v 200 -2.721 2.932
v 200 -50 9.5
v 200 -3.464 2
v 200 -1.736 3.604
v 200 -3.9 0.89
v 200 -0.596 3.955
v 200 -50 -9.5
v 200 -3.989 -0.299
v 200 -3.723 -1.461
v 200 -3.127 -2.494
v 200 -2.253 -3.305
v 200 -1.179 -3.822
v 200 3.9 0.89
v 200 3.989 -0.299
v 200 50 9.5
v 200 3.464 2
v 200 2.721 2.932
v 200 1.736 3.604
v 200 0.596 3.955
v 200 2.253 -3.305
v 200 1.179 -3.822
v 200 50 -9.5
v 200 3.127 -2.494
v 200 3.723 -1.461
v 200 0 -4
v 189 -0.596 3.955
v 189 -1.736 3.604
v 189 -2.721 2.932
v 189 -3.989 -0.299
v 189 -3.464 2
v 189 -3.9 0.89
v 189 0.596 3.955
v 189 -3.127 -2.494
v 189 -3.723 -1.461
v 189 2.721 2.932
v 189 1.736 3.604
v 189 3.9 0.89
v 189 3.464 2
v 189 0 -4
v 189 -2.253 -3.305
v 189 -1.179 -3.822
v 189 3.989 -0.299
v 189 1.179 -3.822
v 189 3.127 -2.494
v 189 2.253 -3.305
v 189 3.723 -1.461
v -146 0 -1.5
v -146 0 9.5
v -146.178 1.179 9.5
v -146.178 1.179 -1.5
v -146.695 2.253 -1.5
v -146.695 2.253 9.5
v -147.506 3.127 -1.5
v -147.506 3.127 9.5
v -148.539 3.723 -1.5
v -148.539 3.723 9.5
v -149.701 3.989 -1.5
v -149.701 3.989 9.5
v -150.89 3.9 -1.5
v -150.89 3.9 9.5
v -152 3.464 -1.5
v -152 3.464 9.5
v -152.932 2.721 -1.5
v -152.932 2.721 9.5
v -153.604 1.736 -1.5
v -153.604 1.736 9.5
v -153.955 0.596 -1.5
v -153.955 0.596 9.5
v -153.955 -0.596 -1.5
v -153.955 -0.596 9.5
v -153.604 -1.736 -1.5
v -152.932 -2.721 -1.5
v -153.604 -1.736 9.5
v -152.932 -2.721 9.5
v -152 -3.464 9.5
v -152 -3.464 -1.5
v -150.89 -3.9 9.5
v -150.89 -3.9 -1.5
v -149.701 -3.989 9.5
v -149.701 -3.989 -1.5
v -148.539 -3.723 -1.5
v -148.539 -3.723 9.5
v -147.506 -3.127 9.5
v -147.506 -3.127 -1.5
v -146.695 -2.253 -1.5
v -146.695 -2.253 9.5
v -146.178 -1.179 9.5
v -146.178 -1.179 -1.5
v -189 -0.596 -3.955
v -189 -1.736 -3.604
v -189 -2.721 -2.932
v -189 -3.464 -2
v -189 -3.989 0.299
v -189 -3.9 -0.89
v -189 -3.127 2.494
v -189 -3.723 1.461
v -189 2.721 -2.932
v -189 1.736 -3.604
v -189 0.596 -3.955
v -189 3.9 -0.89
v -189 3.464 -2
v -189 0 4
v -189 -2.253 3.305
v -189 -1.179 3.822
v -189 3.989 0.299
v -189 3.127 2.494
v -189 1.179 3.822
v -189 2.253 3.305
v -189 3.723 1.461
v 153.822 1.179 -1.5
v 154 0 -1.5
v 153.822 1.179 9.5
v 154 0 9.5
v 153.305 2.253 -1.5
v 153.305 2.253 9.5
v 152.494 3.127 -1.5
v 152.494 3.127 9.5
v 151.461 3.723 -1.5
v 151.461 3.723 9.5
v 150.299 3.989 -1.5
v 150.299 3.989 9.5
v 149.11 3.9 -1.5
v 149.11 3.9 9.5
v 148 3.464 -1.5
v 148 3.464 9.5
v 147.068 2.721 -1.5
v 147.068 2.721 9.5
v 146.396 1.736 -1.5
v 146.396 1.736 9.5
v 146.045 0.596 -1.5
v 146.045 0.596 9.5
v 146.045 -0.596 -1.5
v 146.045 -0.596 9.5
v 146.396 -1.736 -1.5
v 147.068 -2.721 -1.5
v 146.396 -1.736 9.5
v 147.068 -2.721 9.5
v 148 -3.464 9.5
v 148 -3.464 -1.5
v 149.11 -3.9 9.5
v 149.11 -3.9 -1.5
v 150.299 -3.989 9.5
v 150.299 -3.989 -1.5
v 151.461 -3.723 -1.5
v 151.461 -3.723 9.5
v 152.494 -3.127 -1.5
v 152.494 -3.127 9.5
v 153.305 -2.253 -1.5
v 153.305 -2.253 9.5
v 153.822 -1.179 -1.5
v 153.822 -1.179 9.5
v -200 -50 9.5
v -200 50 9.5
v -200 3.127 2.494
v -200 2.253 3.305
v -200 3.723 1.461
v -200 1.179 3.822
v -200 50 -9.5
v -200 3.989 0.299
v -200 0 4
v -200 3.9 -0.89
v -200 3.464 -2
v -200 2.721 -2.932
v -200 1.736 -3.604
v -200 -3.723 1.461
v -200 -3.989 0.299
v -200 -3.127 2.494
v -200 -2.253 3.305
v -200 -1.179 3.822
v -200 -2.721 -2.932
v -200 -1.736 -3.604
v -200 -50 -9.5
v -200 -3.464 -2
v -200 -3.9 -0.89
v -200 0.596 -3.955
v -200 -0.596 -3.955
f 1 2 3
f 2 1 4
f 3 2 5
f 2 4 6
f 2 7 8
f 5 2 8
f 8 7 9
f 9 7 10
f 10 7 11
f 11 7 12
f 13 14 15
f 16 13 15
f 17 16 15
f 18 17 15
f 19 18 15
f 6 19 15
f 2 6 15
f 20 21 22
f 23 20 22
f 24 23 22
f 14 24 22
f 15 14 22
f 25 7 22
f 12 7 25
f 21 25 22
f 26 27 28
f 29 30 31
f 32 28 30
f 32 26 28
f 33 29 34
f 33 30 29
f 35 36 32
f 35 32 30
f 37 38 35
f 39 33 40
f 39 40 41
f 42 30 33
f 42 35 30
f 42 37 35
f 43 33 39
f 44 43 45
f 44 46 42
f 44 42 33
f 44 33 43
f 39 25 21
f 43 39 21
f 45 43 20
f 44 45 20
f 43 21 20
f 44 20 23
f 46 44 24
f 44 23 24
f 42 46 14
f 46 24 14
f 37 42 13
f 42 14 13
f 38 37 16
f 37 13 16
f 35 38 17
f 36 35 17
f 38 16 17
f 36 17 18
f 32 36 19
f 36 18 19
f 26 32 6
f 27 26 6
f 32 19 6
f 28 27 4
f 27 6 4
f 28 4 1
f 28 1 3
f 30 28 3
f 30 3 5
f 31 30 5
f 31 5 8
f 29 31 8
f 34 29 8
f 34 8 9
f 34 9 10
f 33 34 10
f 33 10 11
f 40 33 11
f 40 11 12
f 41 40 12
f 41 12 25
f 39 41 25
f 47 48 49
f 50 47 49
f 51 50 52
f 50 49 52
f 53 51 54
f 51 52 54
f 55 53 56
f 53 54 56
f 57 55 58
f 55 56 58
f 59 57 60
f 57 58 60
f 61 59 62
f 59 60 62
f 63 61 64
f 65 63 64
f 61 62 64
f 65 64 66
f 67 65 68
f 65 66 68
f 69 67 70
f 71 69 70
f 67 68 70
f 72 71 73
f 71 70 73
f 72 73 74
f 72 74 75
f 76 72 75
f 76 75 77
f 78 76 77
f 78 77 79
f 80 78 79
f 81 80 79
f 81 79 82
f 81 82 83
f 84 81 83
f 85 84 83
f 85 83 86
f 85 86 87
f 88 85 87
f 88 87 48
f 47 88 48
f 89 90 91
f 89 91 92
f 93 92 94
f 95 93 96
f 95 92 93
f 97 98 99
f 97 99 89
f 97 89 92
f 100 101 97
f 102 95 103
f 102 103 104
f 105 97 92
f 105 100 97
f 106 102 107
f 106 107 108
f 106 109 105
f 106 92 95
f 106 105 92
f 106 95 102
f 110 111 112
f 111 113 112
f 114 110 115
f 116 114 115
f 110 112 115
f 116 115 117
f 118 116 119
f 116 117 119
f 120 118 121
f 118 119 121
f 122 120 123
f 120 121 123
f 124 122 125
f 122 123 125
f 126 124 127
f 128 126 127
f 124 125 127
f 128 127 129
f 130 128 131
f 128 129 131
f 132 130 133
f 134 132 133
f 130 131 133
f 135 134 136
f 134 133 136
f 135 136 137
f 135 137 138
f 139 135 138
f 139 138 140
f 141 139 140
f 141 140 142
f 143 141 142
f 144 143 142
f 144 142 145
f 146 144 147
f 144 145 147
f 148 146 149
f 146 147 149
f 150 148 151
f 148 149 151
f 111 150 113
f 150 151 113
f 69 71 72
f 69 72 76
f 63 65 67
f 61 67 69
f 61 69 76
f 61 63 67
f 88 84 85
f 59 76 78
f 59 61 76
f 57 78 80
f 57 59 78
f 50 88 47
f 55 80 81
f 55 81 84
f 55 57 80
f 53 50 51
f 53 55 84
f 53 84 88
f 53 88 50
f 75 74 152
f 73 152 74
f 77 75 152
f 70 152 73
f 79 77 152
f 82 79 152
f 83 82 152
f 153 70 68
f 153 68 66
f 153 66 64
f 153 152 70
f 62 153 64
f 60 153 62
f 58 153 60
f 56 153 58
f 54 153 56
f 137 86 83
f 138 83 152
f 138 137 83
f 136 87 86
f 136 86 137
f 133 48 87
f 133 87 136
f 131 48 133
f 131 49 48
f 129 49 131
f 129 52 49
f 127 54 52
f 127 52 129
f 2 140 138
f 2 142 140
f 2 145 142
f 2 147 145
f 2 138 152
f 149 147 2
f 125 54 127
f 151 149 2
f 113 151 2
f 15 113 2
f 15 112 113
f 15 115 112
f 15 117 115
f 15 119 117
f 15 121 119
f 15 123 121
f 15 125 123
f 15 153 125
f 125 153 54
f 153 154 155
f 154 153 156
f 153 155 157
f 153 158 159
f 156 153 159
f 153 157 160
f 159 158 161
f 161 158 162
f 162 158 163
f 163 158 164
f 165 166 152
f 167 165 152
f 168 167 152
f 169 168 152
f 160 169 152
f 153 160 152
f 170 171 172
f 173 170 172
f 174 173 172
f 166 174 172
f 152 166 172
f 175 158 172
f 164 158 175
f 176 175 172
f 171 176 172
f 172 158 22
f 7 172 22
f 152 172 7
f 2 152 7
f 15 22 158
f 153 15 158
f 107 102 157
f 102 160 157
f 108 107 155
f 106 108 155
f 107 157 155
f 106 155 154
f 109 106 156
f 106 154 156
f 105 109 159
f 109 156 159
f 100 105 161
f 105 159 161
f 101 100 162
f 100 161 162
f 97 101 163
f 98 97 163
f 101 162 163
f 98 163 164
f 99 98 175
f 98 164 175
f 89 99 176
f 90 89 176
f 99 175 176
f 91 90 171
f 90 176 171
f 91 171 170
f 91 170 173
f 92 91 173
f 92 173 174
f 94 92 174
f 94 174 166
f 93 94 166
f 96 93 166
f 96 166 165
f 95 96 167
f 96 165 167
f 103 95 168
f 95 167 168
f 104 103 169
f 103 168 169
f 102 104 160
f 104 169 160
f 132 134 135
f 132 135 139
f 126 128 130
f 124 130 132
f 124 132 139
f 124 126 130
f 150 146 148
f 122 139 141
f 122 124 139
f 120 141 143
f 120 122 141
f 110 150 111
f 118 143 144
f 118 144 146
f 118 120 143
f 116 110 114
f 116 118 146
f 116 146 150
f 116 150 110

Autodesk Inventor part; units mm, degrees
ref_plane "YZ Plane" through (0, 0, 0) normal (1, 0, 0) x (0, 1, 0)
ref_plane "XZ Plane" through (0, 0, 0) normal (0, 1, 0) x (-1, 0, 0)
ref_plane "XY Plane" through (0, 0, 0) normal (0, 0, 1) x (1, 0, 0)
sketch "Sketch1" plane through (0, 0, 0) normal (0, 0, 1) x (1, 0, 0)
  line L0 (-200, -50) -> (200, -50)
  line L1 (200, -50) -> (200, 50)
  line L2 (200, 50) -> (-200, 50)
  line L3 (-200, 50) -> (-200, -50)
  line L4 (-200, -50) -> (200, 50) construction
  line L5 (200, -50) -> (-200, 50) construction
  point P0 (0, 0)
  dimension "d0" = 400
  dimension "d1" = 100
extrude "Extrusion1" add sketch "Sketch1" along normal blind 9.5 and the other way blind 9.5
sketch "Sketch2" plane through (0, 0, 9.5) normal (0, 0, 1) x (1, 0, 0)
  line L0 (-200, 50) -> (-200, -50) projected
  line L1 (-200, 0) -> (-150, 0)
  line L2 (200, -50) -> (200, 50) projected
  line L3 (200, 0) -> (150, 0)
  circle A0 centre (-150, 0) radius 4
  circle A1 centre (150, 0) radius 4
  point P0 (0, 0)
  dimension "d6" = 50
  dimension "d7" = 50
  dimension "d8" = 8
  dimension "d9" = 8
extrude "Extrusion2" cut sketch "Sketch2" against normal blind 11
sketch "Sketch3" plane through (200, -50, 9.5) normal (1, 0, 0) x (0, 0, -1)
  circle A0 centre (9.5, 50) radius 4
  dimension "d12" = 8
extrude "Extrusion3" cut sketch "Sketch3" against normal blind 11
sketch "Sketch4" plane through (-200, -50, 9.5) normal (-1, 0, 0) x (0, 0, 1)
  circle A0 centre (-9.5, 50) radius 4
  dimension "d15" = 8
extrude "Extrusion4" cut sketch "Sketch4" against normal blind 11
properties part number "A"
